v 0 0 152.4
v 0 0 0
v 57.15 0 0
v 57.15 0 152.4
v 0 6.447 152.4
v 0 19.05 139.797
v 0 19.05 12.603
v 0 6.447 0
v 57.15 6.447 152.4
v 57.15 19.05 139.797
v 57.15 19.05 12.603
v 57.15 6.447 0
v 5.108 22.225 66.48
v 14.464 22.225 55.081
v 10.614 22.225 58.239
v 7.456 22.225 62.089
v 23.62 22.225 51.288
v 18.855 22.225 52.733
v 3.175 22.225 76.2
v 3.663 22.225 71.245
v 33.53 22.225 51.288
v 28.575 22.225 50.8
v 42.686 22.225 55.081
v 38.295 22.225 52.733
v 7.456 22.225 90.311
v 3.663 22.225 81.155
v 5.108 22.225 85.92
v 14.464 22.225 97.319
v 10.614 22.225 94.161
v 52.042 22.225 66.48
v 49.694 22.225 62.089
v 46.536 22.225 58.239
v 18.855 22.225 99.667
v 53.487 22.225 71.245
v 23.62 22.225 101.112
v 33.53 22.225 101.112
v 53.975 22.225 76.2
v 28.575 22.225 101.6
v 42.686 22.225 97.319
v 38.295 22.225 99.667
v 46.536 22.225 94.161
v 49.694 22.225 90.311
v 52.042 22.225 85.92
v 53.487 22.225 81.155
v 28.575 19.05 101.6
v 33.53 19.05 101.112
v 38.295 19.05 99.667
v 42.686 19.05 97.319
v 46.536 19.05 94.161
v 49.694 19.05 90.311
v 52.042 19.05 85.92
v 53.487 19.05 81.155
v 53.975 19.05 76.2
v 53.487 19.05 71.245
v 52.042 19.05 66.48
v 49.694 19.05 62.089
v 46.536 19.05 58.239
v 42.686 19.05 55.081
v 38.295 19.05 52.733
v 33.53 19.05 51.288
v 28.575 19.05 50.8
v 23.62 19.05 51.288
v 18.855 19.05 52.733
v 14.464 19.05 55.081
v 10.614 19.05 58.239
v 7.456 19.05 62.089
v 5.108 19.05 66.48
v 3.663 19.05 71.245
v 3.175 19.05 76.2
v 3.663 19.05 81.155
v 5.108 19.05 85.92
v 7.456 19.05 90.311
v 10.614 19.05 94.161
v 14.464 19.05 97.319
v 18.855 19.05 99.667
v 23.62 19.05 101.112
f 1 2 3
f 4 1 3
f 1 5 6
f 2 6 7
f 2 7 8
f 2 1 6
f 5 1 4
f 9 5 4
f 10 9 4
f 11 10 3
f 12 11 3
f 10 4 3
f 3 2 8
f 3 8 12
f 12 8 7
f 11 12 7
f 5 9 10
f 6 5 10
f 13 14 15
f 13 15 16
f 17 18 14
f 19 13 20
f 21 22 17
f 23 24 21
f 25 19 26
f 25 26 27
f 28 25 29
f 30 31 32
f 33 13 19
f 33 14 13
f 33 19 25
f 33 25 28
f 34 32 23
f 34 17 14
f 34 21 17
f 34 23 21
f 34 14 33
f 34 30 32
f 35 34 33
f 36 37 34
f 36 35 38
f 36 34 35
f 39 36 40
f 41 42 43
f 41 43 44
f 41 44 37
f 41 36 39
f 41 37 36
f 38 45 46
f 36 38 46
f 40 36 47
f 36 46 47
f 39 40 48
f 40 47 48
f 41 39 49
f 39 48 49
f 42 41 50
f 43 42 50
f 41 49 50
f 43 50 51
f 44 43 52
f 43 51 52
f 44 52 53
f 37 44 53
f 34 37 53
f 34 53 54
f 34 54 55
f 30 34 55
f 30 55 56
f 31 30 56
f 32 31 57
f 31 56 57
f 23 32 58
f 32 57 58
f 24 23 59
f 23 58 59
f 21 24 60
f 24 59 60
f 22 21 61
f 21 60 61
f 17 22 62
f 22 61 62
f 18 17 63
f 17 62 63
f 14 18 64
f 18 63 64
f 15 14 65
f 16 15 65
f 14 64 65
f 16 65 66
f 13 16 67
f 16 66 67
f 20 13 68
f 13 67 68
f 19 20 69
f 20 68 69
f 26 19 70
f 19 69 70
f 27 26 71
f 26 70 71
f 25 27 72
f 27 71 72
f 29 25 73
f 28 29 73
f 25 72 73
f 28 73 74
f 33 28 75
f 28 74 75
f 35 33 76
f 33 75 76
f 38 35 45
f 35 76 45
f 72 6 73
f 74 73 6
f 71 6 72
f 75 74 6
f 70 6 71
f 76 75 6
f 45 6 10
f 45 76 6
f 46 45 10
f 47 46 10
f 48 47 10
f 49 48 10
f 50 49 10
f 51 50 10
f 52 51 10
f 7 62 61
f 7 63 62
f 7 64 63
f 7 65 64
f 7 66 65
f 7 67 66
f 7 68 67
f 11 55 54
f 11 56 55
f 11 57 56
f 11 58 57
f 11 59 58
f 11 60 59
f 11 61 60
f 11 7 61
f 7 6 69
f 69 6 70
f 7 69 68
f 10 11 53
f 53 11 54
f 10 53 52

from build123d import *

# Parameters (mm, degrees)
SKETCH2_W           = 57.15
SKETCH2_H           = 152.4
BOSS_EXTRUDE1_DEPTH = 19.05
CUT_EXTRUDE2_DEPTH  = 57.15
SKETCH5_R           = 25.4
BOSS_EXTRUDE2_DEPTH = 3.175


with BuildPart() as part:
    # Sketch2 → Boss-Extrude1 (new body)
    with BuildSketch(Plane(origin=(0, 0, 0), x_dir=(1, 0, 0), z_dir=(0, 1, 0))):
        with Locations((28.575, -76.2)):
            Rectangle(SKETCH2_W, SKETCH2_H)
    extrude(amount=BOSS_EXTRUDE1_DEPTH)

    # Sketch3 → Cut-Extrude2 (cut)
    with BuildSketch(Plane(origin=(57.15, 0, 0), x_dir=(0, 0, -1), z_dir=(1, 0, 0))):
        Polygon((-152.4, 6.447169547), (-139.797169547, 19.05), (-152.4, 19.05), align=None)
        Polygon((0, 6.447169547), (-12.602830453, 19.05), (0, 19.05), align=None)
    extrude(amount=-CUT_EXTRUDE2_DEPTH, mode=Mode.SUBTRACT)

    # Sketch5 → Boss-Extrude2 (add)
    with BuildSketch(Plane(origin=(0, 19.05, 0), x_dir=(1, 0, 0), z_dir=(0, 1, 0))):
        with Locations(Location((28.575, -76.2, 0), (0, 0, 270))):
            Circle(SKETCH5_R)
    extrude(amount=BOSS_EXTRUDE2_DEPTH)


solid = part.part
